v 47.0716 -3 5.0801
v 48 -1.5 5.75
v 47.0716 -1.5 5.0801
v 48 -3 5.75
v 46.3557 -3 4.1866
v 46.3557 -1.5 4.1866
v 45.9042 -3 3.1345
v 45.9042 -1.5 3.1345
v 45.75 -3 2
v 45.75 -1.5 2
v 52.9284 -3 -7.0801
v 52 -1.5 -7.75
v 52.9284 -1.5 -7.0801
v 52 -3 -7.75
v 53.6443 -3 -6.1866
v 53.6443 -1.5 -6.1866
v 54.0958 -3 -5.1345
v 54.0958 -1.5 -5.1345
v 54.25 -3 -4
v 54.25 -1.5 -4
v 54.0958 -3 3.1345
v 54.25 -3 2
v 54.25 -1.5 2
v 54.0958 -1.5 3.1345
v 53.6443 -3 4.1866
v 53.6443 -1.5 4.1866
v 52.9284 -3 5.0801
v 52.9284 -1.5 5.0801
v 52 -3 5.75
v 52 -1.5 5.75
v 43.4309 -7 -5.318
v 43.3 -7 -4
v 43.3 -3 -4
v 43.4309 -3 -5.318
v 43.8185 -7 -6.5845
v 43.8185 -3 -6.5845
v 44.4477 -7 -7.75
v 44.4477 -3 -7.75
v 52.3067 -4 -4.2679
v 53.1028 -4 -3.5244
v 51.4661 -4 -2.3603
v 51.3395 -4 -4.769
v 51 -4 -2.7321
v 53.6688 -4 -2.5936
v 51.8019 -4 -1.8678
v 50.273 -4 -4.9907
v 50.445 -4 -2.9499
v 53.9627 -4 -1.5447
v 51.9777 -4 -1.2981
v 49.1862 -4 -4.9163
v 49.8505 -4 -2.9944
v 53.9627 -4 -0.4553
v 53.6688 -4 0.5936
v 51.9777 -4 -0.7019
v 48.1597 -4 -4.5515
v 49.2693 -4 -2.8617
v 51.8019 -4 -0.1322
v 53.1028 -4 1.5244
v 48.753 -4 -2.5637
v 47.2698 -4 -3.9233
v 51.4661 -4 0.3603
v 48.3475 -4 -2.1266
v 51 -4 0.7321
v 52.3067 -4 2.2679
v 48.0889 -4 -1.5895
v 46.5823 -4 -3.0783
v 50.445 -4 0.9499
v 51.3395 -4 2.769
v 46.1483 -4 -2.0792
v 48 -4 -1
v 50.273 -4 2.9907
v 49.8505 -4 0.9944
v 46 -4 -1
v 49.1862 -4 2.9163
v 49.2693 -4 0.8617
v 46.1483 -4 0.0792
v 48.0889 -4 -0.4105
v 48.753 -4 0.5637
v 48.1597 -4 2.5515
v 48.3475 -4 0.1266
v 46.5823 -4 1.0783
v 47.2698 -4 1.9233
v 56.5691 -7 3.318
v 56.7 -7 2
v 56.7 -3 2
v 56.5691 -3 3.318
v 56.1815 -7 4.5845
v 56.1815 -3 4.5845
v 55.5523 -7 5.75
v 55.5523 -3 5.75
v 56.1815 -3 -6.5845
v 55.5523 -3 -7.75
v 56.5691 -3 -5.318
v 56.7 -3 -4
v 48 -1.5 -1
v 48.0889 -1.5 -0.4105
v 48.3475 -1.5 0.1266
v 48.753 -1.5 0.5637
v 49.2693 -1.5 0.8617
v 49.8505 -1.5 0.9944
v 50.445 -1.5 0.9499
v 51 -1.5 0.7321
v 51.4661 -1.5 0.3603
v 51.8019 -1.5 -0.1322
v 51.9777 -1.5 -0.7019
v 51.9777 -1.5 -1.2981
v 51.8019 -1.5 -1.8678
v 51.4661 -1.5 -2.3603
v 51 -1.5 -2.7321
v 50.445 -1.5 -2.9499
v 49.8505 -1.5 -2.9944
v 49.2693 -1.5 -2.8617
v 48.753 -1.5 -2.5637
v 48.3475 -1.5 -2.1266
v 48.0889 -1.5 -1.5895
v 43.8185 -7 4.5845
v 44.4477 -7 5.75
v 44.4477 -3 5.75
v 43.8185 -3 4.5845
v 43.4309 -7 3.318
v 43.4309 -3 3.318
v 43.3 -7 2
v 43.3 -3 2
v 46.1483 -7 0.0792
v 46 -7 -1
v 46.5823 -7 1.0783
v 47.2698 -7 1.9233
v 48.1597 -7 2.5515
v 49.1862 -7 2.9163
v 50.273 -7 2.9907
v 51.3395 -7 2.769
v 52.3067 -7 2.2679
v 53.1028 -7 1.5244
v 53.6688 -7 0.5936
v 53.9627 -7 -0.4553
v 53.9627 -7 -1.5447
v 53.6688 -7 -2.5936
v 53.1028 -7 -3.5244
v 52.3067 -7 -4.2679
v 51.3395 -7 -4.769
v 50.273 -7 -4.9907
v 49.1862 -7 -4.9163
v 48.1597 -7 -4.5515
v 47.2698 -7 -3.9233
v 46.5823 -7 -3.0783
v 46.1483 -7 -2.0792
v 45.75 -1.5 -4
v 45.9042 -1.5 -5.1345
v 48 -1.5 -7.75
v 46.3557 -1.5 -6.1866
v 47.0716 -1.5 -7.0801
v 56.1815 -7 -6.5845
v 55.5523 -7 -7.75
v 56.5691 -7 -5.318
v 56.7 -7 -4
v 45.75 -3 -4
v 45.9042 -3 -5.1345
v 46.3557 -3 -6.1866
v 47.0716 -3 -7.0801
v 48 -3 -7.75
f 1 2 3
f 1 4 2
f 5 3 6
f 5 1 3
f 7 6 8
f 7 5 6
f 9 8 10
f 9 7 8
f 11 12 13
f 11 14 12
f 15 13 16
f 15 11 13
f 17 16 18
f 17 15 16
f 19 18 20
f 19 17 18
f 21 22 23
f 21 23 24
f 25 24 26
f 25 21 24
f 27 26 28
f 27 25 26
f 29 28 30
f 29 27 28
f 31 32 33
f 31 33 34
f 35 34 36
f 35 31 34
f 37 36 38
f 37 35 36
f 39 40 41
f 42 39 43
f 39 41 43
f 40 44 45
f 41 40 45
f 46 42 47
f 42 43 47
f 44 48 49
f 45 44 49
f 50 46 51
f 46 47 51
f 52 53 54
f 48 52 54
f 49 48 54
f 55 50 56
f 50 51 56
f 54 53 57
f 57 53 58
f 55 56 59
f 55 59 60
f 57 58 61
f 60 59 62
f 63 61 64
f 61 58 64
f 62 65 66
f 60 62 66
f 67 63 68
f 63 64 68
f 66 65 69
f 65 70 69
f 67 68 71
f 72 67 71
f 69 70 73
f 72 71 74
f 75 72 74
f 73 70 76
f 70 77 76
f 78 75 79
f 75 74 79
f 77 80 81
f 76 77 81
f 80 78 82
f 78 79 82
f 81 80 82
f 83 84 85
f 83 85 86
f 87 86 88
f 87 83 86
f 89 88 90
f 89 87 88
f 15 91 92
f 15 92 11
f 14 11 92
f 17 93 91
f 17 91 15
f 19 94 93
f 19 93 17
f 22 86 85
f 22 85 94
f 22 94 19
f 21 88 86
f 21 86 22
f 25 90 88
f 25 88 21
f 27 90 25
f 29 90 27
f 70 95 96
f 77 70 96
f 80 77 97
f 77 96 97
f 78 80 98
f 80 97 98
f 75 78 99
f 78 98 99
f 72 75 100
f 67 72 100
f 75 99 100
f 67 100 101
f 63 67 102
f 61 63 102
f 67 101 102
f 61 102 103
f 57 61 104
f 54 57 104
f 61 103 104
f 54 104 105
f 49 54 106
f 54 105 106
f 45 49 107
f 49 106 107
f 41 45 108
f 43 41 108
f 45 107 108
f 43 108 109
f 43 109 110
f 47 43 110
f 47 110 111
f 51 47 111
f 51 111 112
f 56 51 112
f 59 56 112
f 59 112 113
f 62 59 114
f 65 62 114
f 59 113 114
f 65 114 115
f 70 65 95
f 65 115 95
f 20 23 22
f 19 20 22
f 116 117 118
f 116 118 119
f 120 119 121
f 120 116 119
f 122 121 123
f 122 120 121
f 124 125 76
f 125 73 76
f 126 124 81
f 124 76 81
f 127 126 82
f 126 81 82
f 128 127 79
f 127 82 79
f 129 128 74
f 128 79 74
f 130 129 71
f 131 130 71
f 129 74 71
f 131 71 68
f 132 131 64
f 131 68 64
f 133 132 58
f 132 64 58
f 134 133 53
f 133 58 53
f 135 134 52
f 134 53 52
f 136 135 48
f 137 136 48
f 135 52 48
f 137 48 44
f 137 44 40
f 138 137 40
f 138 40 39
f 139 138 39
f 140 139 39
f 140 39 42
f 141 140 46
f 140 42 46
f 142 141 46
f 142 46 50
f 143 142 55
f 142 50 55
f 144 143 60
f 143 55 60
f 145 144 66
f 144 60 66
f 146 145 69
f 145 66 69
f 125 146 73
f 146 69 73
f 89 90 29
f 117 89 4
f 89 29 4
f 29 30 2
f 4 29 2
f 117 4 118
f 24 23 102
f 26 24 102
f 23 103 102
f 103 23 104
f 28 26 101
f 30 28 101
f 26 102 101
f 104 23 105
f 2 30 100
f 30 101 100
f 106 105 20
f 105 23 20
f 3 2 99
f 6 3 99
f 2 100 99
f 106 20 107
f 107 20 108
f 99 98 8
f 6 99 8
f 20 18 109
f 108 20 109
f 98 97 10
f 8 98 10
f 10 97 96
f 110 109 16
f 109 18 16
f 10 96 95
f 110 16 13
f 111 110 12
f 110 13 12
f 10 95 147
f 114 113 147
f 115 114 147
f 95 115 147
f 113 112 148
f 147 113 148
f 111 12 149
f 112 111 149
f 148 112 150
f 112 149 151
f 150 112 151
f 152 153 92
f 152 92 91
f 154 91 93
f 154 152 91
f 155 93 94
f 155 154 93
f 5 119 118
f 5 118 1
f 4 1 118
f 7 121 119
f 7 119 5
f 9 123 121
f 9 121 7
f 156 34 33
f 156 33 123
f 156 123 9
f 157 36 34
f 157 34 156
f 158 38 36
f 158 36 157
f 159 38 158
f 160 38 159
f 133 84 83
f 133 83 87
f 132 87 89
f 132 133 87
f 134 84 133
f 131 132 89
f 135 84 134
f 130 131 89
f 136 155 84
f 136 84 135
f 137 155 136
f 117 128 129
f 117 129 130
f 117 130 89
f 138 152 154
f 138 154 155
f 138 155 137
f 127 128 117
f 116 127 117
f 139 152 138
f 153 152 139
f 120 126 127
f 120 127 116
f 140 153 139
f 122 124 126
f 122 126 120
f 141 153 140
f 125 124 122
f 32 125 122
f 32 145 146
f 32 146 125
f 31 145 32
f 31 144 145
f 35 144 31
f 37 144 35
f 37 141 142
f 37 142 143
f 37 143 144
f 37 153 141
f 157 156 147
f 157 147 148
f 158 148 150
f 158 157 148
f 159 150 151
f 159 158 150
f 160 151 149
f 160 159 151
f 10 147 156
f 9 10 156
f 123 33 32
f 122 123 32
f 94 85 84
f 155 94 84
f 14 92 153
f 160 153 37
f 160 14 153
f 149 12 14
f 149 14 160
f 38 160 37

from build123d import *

# Parameters (mm, degrees)
SKETCH148_W             = 15
SKETCH148_H             = 5.5
PAD032_DEPTH            = 6.75
BODY059_PLACEMENT_ANGLE = 180


with BuildPart() as part:
    # Sketch148 → Pad032 (new body, symmetric)
    with BuildSketch(Plane.XY):
        with Locations((0, -4.25)):
            Rectangle(SKETCH148_W, SKETCH148_H)
    extrude(amount=PAD032_DEPTH, both=True)

    # Sketch149 → Groove006 (revolve, cut)
    with BuildSketch(Plane.XY):
        Polygon((0, 0), (0, -8), (4, -8), (4, -4), (2, -4), (2, 0), align=None)
    revolve(axis=Axis((0, 0, 0), (0, 1, 0)), mode=Mode.SUBTRACT)

    # SubtractivePipe006003: sweep along a path in Sketch150
    with BuildLine(Plane.XZ) as subtractivepipe006003_path:
        ThreePointArc((6.75, 3), (0, 9.75), (-6.75, 3))
        Line((-6.75, 3), (-6.75, -3))
        ThreePointArc((-6.75, -3), (0, -9.75), (6.75, -3))
        Line((6.75, -3), (6.75, 3))
    # Sketch151 → SubtractivePipe006003 (sweep, cut)
    with BuildSketch(Plane.XY):
        Polygon((4.25, 0), (4.25, -3), (6.7, -3), (6.7, -8), (10, -8), (10, 0), align=None)
    sweep(path=subtractivepipe006003_path.line, mode=Mode.SUBTRACT)


with BuildPart() as part_1:
    # Body059 placement: moved
    add(part.part.moved(Location((50, 0, -1))).rotate(Axis((50, 0, -1), (0, 1, 0)), BODY059_PLACEMENT_ANGLE))


solid = part_1.part
